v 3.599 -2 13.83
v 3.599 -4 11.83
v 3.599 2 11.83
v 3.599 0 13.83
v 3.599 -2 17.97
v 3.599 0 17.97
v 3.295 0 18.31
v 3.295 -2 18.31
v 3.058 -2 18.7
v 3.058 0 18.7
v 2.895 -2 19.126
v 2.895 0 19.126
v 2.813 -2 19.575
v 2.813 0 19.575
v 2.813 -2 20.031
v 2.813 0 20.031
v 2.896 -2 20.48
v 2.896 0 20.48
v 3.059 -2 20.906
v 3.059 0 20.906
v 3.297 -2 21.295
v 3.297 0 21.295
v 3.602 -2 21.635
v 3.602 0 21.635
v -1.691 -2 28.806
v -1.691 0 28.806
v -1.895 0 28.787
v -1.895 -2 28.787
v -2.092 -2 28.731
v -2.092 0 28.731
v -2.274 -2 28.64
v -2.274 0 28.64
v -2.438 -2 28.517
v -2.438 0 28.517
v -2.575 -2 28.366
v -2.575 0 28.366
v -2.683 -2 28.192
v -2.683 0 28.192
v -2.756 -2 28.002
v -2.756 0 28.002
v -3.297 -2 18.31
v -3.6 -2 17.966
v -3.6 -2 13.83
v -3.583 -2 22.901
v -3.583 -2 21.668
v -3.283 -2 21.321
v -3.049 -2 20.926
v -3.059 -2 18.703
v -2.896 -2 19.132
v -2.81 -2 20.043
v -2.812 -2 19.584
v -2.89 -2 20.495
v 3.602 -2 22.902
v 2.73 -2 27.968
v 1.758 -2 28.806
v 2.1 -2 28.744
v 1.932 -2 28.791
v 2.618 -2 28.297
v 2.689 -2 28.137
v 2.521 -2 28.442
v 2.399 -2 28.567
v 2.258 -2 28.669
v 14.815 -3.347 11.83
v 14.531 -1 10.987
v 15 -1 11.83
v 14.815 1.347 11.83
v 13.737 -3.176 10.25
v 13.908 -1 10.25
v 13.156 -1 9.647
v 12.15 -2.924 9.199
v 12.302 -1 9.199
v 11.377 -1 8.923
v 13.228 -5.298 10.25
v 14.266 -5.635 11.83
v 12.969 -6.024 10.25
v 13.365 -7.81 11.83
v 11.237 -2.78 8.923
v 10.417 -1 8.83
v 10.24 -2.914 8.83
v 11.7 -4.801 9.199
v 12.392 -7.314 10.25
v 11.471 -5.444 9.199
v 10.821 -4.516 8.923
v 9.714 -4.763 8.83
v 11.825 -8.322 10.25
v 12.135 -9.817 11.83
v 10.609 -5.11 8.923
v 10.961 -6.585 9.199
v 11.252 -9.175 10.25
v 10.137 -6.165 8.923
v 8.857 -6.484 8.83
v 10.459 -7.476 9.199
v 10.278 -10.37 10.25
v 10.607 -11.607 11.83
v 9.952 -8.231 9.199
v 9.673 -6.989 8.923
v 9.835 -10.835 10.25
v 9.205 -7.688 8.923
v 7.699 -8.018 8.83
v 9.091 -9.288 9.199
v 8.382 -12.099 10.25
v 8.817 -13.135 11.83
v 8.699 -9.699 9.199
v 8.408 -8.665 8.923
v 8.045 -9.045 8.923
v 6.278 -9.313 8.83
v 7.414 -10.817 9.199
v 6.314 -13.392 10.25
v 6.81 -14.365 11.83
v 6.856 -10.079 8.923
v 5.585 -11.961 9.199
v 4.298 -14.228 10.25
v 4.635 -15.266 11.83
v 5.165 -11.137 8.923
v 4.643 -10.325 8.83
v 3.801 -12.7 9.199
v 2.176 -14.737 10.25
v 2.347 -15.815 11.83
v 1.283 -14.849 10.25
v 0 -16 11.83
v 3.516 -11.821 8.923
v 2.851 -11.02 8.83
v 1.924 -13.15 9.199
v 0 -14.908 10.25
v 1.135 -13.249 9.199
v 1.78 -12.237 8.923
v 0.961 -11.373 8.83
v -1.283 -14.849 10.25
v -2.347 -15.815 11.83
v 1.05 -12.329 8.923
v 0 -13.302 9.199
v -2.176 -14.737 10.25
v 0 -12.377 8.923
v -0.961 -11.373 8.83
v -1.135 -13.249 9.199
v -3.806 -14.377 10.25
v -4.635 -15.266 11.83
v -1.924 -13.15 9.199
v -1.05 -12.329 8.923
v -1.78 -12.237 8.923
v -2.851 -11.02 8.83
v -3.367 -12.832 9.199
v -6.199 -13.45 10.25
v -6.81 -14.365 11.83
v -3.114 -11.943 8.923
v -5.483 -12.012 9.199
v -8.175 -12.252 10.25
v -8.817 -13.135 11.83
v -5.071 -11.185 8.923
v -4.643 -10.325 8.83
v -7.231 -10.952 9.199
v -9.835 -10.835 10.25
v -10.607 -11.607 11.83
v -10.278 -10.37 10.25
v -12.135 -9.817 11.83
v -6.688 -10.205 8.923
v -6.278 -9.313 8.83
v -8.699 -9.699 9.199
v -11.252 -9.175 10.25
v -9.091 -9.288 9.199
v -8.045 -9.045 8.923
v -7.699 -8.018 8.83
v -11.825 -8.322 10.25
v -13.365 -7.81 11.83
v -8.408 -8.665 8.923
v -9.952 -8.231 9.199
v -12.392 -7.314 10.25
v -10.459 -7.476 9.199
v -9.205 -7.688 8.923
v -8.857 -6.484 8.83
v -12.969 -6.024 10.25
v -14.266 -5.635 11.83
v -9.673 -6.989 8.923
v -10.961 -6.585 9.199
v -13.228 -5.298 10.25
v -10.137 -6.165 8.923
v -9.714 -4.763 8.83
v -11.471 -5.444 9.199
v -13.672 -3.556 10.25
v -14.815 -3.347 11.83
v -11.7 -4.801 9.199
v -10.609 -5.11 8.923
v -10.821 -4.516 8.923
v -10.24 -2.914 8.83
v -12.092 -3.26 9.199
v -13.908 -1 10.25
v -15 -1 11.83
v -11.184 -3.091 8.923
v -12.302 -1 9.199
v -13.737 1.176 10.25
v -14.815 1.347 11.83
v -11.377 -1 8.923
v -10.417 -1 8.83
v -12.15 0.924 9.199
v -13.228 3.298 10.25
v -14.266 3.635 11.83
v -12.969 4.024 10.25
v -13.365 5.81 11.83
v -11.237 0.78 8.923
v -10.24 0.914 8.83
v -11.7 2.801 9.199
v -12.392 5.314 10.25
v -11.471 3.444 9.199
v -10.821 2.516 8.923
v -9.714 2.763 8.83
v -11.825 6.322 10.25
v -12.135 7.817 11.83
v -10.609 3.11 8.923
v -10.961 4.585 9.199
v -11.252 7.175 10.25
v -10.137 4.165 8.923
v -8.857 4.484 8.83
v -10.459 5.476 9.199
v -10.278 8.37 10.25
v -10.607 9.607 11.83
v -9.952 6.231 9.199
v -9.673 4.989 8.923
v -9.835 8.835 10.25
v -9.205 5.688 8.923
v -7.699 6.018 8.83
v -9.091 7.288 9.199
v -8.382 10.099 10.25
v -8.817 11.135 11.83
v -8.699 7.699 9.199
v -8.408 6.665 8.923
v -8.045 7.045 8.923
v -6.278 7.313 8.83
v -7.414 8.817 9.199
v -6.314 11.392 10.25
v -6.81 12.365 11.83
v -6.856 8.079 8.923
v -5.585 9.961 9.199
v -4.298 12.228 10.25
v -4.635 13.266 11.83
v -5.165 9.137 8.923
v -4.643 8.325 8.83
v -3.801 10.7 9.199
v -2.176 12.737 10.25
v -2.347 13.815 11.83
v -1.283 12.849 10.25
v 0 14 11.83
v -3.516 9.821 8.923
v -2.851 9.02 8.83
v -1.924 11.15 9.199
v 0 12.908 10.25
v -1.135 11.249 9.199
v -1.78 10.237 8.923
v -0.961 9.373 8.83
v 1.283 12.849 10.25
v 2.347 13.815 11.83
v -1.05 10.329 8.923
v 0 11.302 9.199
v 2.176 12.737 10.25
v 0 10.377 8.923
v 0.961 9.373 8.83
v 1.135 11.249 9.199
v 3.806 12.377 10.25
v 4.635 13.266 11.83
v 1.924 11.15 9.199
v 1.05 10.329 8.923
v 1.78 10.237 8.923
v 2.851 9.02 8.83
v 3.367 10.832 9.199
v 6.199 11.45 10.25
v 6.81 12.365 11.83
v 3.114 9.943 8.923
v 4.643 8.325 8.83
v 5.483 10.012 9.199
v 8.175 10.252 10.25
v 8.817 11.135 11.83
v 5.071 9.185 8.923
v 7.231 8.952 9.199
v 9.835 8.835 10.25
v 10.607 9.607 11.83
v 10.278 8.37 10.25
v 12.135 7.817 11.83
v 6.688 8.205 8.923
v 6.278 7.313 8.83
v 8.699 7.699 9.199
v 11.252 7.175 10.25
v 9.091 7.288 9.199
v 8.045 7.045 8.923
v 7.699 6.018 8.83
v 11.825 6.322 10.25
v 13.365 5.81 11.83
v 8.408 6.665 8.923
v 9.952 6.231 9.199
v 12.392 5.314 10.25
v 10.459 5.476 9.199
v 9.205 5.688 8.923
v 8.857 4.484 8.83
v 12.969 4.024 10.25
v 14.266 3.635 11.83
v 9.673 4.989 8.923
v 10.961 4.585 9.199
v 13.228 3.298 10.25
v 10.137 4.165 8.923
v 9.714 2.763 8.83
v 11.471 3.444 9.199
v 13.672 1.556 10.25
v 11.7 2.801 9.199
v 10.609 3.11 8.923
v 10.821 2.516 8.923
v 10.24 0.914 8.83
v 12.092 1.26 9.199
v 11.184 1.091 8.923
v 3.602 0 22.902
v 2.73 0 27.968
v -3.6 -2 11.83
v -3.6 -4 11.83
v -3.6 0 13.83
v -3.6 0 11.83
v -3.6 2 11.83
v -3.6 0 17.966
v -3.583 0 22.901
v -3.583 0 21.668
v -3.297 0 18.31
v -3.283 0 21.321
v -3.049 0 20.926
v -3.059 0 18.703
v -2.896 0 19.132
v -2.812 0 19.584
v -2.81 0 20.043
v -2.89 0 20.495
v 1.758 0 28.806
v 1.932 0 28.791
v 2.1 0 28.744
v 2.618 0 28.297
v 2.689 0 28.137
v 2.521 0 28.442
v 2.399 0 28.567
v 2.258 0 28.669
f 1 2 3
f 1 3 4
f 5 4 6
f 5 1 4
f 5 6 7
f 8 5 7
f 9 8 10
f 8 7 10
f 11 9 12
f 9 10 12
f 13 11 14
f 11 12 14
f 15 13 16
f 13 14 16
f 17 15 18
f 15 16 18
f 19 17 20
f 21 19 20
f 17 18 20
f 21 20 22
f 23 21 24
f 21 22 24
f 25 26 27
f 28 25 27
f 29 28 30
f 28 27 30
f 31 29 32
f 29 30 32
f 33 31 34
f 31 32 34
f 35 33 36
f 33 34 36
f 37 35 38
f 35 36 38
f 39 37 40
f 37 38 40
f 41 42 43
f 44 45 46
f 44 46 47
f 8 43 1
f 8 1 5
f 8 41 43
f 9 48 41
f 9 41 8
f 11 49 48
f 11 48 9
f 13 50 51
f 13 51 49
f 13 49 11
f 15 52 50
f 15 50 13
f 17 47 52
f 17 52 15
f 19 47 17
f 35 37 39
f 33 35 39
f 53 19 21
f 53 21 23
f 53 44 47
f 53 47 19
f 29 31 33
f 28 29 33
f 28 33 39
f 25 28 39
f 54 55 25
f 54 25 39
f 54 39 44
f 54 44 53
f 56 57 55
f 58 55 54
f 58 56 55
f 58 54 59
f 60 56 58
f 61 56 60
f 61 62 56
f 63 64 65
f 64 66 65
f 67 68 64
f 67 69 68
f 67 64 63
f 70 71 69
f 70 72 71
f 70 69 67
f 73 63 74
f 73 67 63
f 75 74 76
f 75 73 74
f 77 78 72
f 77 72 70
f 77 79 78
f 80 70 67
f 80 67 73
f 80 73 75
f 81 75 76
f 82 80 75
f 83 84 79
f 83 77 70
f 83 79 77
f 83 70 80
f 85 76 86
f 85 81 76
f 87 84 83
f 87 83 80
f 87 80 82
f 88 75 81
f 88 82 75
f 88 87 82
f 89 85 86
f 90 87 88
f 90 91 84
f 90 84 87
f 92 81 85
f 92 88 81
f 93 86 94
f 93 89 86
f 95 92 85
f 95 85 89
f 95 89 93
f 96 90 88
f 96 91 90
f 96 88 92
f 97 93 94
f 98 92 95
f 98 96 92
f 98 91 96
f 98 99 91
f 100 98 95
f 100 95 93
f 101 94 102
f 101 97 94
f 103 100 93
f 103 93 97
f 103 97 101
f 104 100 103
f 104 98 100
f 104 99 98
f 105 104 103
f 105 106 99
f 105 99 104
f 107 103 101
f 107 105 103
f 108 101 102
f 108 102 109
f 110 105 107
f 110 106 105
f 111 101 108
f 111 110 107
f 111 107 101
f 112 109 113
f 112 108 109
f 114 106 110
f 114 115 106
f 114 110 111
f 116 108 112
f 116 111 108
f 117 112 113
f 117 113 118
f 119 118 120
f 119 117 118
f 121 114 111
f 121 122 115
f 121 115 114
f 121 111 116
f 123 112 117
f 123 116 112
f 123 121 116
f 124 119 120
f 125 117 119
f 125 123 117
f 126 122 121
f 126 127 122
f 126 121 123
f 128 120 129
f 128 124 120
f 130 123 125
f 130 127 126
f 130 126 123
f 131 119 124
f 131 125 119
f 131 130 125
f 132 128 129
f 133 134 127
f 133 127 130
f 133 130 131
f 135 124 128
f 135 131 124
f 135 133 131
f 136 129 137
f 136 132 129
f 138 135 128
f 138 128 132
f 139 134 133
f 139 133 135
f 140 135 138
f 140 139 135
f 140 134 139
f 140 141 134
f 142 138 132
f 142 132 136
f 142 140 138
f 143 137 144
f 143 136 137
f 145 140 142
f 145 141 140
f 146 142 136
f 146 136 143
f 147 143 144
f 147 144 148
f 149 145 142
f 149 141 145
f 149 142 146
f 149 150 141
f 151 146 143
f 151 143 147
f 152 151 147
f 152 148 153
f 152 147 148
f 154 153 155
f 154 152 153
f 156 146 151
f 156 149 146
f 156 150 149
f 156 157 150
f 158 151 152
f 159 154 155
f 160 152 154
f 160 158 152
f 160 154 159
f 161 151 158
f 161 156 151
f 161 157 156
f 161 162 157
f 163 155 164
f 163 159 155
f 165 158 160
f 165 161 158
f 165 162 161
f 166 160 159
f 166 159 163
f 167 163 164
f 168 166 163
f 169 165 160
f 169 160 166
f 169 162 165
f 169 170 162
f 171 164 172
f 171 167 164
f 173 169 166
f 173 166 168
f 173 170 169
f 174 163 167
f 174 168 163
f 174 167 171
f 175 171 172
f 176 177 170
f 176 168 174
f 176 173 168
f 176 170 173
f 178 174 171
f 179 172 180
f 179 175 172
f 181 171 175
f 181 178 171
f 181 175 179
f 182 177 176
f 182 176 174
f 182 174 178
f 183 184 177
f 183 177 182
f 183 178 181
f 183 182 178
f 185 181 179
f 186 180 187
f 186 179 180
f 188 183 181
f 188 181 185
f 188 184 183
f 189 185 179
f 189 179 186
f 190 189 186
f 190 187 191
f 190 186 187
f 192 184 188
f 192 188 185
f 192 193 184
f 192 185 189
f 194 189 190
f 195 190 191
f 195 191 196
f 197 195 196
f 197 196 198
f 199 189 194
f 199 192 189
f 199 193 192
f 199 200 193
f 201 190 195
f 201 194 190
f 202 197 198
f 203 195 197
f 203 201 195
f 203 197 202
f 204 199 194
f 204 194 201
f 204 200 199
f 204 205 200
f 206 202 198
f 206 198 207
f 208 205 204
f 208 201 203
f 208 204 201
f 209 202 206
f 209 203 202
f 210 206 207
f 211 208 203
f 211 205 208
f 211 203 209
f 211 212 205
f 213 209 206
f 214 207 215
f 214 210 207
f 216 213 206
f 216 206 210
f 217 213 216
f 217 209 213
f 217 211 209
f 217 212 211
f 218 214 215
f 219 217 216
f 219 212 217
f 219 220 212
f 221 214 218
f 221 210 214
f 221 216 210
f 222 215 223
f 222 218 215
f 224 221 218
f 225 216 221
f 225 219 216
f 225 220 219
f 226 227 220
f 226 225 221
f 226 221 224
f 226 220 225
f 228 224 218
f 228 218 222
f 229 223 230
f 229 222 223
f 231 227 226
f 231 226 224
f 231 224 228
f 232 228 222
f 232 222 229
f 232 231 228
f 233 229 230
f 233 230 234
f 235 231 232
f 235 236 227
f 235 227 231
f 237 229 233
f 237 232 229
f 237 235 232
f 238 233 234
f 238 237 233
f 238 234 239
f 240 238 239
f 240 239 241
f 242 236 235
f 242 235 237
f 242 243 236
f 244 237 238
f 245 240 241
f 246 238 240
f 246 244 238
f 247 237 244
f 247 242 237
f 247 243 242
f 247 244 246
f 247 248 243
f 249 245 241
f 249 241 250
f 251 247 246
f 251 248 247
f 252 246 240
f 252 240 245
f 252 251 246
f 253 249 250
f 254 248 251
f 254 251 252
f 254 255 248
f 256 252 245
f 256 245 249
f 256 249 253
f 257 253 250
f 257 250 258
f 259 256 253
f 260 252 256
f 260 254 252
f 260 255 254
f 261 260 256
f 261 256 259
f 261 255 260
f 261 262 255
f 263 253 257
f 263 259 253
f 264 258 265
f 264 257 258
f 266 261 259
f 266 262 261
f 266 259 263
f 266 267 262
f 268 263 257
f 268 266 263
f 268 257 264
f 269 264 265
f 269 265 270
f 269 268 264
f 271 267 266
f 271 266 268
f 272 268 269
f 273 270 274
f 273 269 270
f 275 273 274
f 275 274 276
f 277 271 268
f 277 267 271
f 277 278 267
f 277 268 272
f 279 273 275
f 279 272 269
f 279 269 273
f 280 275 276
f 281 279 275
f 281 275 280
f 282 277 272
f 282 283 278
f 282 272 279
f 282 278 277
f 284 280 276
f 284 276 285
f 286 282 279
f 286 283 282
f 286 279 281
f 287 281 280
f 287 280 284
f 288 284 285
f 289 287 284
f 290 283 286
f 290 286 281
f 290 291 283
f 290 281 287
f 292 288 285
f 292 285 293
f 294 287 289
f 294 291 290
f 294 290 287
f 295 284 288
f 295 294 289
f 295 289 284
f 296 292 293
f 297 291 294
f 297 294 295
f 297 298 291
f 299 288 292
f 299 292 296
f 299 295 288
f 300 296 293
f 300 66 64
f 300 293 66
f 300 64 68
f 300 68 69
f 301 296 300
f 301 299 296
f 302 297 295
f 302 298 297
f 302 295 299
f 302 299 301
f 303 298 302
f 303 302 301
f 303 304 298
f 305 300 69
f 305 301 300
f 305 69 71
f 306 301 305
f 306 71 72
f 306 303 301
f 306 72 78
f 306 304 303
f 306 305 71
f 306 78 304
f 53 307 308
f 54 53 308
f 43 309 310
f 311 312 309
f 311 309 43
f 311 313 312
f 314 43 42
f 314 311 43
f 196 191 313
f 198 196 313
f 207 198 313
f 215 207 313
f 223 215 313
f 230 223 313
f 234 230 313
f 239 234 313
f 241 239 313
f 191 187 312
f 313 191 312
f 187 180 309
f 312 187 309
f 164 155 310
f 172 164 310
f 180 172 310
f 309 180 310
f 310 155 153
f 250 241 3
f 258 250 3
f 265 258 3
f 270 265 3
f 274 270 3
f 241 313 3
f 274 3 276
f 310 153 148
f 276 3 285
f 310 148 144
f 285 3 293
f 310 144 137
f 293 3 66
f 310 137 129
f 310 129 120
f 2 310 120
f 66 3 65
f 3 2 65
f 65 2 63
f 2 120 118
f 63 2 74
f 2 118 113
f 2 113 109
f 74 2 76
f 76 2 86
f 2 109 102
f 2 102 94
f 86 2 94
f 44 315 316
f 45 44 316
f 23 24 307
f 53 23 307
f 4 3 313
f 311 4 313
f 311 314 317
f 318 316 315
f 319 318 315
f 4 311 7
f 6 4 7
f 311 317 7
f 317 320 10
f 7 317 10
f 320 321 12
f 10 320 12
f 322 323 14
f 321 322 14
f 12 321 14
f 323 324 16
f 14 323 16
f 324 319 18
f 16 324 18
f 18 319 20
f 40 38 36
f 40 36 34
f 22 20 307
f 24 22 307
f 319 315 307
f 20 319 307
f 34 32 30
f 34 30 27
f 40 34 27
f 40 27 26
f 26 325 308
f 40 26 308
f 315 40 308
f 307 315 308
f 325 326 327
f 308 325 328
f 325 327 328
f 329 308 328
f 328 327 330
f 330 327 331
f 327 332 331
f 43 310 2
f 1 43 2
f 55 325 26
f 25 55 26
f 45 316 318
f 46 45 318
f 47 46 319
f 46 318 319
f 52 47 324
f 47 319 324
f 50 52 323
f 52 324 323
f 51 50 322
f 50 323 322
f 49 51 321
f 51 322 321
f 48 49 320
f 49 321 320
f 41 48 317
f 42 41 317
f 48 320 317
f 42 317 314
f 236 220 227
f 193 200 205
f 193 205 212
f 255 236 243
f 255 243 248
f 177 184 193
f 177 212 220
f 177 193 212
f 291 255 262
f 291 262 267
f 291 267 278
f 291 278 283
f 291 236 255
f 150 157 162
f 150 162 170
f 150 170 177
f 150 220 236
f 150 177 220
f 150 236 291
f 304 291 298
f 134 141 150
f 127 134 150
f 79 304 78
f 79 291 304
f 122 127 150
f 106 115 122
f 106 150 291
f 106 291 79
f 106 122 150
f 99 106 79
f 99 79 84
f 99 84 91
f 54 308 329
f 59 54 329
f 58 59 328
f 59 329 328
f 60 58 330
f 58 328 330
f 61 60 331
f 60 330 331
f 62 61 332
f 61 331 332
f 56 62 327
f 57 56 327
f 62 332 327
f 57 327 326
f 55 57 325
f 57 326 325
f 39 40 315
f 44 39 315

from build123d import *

# Parameters (mm, degrees)
F1_DEPTH = 2
F2_R     = 15
F2_W     = 7.199677173
F2_H     = 2
F3_DEPTH = 3
F4_W     = 7.199677173
F4_H     = 2
F5_DEPTH = 2
F6_SIZE  = 1.99999
F7_W     = 7.199677173
F7_H     = 2
F8_DEPTH = 2
F9_SIZE  = 1.99999


# Not quite as in the source:
# - a fillet or chamfer that OpenCascade refuses, or shapes differently, is made with other operations: its cross-section is extruded or revolved along the edge and cut away or added
# - a fillet or chamfer is up to 0.001 mm smaller than in the source, because OpenCascade refuses the exact size


with BuildPart() as f1:
    # F0 (on Front) → F1 (new body)
    with BuildSketch(Plane.XZ):
        with BuildLine():
            ThreePointArc((-1.6914953012, 28.8060177118), (-2.3588223185, 28.5823009391), (-2.7564610355, 28.0015617609))
            Line((-2.7564610355, 28.0015617609), (-3.5831569694, 22.9014810175))
            Line((-3.5831569694, 22.9014810175), (-3.5831569694, 21.6677952558))
            ThreePointArc((-3.5831569694, 21.6677952558), (-2.8004223212, 19.8132576007), (-3.6002863199, 17.9660432041))
            Line((-3.6002863199, 17.9660432041), (-3.6002863199, 11.8300495669))
            Line((-3.6002863199, 11.8300495669), (3.5993908532, 11.8300495669))
            Line((3.5993908532, 11.8300495669), (3.5993908532, 17.969943583))
            ThreePointArc((3.5993908532, 17.969943583), (2.8023887863, 19.8030117696), (3.6017470993, 21.6350536793))
            Line((3.6017470993, 21.6350536793), (3.6017470993, 22.9016747326))
            Line((3.6017470993, 22.9016747326), (2.7295136824, 27.9675517231))
            ThreePointArc((2.7295136824, 27.9675517231), (2.3994359185, 28.5674317792), (1.7576538958, 28.8060177118))
            Line((1.7576538958, 28.8060177118), (-1.6914953012, 28.8060177118))
        make_face()
    extrude(amount=F1_DEPTH)

    # F2 (on face) → F3 (join)
    with BuildSketch(Plane(origin=(0, 0, 11.8300495669), x_dir=(1, 0, 0), z_dir=(0, 0, -1))):
        with Locations((0, 1)):
            Circle(F2_R)
        with Locations((-0.0004477333, 1)):
            Rectangle(F2_W, F2_H, mode=Mode.SUBTRACT)
        with Locations((-0.0004477333, 1)):
            Rectangle(F2_W, F2_H)
    extrude(amount=F3_DEPTH)

    # F4 (on face) → F5 (join)
    with BuildSketch(Plane(origin=(0, 0, 0), x_dir=(-1, 0, 0), z_dir=(0, 1, 0))):
        with Locations((0.0004477333, 12.8300495669)):
            Rectangle(F4_W, F4_H)
    extrude(amount=F5_DEPTH)

    # F6 (size 2 in the source; OpenCascade refuses exactly that, so slightly less here)
    f6_edges = [f1.edges().sort_by_distance(p)[0] for p in [
        (-0.000448, 2, 13.83005),
    ]]
    chamfer(f6_edges, length=F6_SIZE)

    # F7 (on face) → F8 (join)
    with BuildSketch(Plane.XZ.offset(2)):
        with Locations((-0.0004477333, 12.8300495669)):
            Rectangle(F7_W, F7_H)
    extrude(amount=F8_DEPTH)

    # F9 (size 2 in the source; OpenCascade refuses exactly that, so slightly less here)
    f9_edges = [f1.edges().sort_by_distance(p)[0] for p in [
        (-0.000448, -4, 13.83005),
    ]]
    chamfer(f9_edges, length=F9_SIZE)

    # F10: fillet of radius 5 on 1 edges, made by hand

    # F10_s1 → F10_t2 (revolve, cut)
    with BuildSketch(Plane.XZ.offset(1)):
        with BuildLine():
            ThreePointArc((15, 11.8300495669), (13.1560370926, 9.6467494343), (10.417424305, 8.8300495669))
            Line((10.417424305, 8.8300495669), (15, 8.8300495669))
            Line((15, 8.8300495669), (15, 11.8300495669))
        make_face()
    revolve(axis=Axis((0, -1, 8.8300495669), (0, 0, -1)), mode=Mode.SUBTRACT)


solid = f1.part
